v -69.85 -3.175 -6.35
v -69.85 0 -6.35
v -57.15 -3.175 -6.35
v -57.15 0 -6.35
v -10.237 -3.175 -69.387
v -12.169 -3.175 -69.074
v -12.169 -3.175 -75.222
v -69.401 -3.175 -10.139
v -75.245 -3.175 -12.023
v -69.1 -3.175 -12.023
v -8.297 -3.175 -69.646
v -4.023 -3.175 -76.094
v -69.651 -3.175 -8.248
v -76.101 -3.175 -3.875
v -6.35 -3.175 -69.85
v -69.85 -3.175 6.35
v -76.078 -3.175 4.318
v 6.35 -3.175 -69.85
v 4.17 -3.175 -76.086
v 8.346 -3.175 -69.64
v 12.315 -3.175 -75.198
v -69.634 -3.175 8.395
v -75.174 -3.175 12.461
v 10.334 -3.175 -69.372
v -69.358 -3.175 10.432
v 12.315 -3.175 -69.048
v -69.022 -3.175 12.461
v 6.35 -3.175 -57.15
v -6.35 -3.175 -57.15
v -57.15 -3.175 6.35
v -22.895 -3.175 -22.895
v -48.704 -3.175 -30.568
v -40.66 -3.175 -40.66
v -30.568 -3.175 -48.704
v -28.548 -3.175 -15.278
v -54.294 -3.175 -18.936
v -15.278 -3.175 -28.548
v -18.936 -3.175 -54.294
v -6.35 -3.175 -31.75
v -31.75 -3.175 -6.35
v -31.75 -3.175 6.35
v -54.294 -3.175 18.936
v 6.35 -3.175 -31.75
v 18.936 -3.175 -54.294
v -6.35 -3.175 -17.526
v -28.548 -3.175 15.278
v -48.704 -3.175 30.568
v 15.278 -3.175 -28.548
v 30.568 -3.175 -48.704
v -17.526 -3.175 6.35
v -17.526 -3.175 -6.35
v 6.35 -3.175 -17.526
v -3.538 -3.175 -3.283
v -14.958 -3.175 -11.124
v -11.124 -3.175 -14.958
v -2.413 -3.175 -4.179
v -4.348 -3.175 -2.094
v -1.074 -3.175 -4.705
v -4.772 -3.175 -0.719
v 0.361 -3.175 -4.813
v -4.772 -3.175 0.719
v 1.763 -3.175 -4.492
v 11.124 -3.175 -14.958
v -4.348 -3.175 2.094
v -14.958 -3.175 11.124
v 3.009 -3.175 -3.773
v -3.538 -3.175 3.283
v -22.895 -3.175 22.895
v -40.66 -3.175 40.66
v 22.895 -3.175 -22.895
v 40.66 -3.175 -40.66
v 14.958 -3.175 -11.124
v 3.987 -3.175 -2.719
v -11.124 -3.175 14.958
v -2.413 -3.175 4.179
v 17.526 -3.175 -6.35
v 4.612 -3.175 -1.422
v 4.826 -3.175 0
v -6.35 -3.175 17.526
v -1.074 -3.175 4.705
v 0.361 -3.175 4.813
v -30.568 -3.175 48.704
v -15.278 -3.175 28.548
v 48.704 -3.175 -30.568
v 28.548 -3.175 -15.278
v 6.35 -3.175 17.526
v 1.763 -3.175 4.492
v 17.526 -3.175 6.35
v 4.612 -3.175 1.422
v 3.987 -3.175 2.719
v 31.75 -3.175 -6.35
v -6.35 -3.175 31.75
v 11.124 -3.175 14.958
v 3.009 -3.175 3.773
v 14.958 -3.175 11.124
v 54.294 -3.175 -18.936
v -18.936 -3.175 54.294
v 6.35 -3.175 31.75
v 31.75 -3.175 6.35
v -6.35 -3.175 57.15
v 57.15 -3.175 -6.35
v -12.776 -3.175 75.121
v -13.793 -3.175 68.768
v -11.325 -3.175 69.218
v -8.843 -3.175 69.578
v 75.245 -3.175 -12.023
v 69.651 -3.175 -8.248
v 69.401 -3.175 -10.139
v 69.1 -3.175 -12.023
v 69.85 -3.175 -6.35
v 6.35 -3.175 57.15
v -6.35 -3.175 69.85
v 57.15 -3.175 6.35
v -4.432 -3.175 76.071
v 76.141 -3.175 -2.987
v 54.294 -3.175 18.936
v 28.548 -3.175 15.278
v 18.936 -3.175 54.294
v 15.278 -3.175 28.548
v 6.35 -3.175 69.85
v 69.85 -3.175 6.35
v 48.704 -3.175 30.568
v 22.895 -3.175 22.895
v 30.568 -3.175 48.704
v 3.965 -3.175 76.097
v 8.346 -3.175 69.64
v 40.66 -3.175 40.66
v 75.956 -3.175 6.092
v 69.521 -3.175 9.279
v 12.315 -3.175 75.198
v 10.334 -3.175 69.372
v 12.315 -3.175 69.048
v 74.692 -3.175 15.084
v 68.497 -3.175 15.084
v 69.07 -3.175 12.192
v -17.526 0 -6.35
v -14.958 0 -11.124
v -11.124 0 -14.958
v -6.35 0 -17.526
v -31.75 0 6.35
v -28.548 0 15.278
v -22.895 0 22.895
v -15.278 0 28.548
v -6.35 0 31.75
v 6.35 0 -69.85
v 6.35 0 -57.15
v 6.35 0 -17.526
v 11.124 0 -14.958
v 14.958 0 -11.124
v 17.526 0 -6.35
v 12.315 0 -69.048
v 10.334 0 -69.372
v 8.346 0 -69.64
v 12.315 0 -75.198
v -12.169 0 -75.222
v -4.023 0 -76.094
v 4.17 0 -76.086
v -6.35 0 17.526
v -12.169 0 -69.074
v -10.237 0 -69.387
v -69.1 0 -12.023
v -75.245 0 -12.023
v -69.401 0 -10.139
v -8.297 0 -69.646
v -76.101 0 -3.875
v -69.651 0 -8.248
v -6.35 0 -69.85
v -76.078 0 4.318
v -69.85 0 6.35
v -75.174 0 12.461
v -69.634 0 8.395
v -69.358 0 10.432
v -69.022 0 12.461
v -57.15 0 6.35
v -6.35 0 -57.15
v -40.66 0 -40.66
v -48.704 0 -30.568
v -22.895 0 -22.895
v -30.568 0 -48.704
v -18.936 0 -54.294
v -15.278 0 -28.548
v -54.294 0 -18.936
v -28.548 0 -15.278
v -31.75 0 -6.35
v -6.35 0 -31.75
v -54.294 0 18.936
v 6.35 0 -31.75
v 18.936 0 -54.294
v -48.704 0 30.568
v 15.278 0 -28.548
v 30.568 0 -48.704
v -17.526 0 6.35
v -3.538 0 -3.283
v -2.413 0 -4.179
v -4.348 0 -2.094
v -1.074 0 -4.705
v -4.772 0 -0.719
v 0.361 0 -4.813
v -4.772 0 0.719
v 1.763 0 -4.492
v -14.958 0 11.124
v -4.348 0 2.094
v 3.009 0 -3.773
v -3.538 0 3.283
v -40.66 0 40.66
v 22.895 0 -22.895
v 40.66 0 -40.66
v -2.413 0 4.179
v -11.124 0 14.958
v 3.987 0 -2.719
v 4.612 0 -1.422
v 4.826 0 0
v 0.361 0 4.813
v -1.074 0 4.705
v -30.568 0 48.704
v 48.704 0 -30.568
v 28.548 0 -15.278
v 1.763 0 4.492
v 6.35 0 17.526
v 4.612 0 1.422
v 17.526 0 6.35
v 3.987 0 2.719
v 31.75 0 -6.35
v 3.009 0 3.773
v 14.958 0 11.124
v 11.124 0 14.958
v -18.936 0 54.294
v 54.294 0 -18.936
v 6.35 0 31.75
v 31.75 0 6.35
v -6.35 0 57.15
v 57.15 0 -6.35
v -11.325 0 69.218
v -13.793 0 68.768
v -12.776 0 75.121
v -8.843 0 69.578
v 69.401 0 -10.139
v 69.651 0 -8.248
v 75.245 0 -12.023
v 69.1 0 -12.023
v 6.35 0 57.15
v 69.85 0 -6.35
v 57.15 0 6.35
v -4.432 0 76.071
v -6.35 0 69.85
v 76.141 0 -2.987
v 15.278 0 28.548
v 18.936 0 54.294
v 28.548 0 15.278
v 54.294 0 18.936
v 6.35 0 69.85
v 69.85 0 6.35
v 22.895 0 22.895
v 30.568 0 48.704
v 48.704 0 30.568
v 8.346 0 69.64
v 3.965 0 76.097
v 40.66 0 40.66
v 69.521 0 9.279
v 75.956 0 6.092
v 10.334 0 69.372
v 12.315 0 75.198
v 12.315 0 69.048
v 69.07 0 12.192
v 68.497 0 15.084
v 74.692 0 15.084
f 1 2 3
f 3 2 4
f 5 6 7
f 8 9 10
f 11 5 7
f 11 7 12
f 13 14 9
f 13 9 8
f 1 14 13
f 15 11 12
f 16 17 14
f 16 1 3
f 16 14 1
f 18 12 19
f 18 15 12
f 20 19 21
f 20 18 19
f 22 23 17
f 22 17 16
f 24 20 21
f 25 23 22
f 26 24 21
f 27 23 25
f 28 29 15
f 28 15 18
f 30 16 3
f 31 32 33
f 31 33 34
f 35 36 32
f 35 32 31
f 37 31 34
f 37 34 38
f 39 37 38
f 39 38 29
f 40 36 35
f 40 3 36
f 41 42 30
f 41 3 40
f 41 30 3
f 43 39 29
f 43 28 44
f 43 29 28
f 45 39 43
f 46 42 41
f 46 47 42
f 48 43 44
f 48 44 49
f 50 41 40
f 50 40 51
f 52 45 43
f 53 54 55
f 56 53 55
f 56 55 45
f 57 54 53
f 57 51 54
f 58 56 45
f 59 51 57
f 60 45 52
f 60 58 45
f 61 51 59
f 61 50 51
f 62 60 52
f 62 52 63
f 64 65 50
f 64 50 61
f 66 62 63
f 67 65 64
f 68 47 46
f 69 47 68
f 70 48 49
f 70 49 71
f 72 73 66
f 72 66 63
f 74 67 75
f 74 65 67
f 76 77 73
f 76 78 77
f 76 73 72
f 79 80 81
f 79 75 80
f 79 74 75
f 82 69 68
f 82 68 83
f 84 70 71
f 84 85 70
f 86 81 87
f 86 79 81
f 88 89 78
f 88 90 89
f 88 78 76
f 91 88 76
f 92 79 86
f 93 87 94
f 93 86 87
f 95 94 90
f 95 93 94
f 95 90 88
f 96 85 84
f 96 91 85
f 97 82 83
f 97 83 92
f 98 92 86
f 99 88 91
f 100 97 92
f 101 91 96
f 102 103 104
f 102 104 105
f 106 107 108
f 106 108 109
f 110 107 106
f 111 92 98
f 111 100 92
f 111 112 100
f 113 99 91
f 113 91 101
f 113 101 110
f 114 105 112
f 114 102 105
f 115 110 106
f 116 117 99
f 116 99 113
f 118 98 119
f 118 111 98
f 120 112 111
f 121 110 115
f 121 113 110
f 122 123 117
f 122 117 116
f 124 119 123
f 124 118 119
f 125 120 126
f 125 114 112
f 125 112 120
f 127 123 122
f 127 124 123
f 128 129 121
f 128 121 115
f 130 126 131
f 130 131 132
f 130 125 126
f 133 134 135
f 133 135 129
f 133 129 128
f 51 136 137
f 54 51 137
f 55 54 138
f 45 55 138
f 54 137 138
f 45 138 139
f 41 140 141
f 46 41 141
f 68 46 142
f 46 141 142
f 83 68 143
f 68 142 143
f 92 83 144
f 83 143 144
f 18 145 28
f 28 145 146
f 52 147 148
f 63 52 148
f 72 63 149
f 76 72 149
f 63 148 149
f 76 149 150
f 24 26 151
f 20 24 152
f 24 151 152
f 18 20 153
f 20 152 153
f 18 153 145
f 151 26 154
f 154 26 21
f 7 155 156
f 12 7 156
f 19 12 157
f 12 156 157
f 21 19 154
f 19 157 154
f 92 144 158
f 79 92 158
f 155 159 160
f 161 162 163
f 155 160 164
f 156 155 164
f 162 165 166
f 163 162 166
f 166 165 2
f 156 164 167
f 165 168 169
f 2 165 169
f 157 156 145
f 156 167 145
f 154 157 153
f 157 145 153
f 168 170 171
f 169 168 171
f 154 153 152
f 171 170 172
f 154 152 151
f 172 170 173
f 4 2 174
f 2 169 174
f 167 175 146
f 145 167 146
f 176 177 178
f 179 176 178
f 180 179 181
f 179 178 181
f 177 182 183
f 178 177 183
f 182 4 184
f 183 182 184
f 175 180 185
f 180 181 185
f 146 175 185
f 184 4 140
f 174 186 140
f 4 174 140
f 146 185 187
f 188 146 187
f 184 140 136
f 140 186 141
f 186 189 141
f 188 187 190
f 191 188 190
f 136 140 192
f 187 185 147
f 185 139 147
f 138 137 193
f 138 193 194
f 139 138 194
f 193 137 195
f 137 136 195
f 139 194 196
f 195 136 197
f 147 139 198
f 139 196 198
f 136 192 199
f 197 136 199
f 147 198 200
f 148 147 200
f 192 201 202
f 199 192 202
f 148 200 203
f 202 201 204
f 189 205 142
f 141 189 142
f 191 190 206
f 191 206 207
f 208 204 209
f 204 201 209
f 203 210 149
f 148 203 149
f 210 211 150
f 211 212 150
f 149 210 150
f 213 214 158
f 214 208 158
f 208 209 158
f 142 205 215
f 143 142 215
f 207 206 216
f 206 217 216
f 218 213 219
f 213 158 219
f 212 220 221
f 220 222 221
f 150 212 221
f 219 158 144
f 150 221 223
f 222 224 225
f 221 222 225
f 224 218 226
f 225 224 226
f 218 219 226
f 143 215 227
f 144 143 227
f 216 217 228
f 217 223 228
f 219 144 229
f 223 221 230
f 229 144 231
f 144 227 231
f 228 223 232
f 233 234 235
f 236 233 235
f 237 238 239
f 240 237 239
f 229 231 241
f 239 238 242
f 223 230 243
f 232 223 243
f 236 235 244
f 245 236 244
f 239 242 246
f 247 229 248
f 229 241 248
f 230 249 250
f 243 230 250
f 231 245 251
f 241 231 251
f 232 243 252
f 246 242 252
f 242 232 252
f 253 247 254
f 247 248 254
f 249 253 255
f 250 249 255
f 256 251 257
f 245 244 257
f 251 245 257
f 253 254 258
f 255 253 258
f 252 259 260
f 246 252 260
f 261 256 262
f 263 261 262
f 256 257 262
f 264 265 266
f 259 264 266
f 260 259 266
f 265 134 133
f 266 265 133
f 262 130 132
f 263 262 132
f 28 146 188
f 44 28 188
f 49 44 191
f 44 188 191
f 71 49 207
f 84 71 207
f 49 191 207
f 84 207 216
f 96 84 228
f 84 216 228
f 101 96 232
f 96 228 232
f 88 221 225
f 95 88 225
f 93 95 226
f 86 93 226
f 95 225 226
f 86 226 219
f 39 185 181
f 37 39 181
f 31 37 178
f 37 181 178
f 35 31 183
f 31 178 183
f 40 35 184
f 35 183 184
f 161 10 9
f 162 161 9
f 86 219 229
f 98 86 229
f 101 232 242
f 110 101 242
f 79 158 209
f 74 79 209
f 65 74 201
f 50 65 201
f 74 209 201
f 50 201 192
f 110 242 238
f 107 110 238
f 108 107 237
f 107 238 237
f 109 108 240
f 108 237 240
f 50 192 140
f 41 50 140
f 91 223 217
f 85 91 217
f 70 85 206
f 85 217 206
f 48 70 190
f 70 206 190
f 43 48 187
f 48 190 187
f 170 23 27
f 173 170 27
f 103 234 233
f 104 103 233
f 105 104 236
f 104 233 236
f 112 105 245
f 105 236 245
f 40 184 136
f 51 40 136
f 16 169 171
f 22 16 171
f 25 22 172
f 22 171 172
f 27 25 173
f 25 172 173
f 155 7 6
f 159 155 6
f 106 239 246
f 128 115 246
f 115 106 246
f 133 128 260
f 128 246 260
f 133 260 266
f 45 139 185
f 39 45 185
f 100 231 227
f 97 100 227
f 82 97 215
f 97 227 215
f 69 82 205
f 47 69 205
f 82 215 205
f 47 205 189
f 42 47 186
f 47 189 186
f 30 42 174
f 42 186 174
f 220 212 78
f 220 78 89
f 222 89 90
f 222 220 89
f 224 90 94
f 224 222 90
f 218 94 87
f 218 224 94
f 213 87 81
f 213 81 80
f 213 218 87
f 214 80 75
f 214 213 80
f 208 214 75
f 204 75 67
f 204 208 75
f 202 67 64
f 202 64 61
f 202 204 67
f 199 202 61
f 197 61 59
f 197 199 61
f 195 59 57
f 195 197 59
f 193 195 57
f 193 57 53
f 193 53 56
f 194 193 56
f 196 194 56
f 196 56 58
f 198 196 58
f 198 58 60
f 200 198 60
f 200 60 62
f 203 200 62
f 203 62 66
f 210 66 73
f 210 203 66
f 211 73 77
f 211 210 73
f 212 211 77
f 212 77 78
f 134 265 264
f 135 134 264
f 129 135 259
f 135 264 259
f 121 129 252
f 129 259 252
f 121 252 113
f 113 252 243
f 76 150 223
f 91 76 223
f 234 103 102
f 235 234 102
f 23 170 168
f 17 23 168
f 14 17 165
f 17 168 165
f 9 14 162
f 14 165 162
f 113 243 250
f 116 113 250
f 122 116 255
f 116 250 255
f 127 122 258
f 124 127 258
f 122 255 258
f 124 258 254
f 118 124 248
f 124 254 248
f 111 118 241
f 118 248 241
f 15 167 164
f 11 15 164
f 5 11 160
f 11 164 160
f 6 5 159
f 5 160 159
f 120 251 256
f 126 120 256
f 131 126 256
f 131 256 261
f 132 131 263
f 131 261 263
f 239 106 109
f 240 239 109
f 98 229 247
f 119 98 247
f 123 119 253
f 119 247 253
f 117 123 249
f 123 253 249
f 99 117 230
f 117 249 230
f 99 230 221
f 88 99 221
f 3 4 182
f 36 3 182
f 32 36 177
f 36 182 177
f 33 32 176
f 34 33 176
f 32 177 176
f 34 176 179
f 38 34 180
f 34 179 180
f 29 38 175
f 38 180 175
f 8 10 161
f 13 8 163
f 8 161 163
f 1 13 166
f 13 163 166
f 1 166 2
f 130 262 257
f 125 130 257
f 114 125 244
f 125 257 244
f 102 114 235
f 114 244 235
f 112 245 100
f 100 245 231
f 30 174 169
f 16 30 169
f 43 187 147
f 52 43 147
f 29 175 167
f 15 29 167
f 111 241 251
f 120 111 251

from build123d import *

# Parameters (mm, degrees)
F0_R     = 76.2
F0_R_2   = 4.826
F1_DEPTH = 3.175
F3_DEPTH = 25.4


with BuildPart() as f1:
    # F0 (on Front) → F1 (new body)
    with BuildSketch(Plane.XZ):
        Circle(F0_R)
        with BuildLine():
            ThreePointArc((-57.15, -6.35), (-40.659839, -40.659839), (-6.35, -57.15))
            Line((-6.35, -57.15), (-6.35, -69.85))
            ThreePointArc((-6.35, -69.85), (-49.595085, -49.595085), (-69.85, -6.35))
            Line((-69.85, -6.35), (-57.15, -6.35))
        make_face(mode=Mode.SUBTRACT)
        with BuildLine():
            Line((-31.75, -6.35), (-17.526, -6.35))
            ThreePointArc((-17.526, -6.35), (-13.181107, -13.181107), (-6.35, -17.526))
            Line((-6.35, -17.526), (-6.35, -31.75))
            ThreePointArc((-6.35, -31.75), (-22.895251, -22.895251), (-31.75, -6.35))
        make_face(mode=Mode.SUBTRACT)
        with BuildLine():
            Line((6.35, -31.75), (6.35, -17.526))
            ThreePointArc((6.35, -17.526), (13.181107, -13.181107), (17.526, -6.35))
            Line((17.526, -6.35), (31.75, -6.35))
            ThreePointArc((31.75, -6.35), (22.895251, -22.895251), (6.35, -31.75))
        make_face(mode=Mode.SUBTRACT)
        with BuildLine():
            ThreePointArc((6.35, -57.15), (40.659839, -40.659839), (57.15, -6.35))
            Line((57.15, -6.35), (69.85, -6.35))
            ThreePointArc((69.85, -6.35), (49.595085, -49.595085), (6.35, -69.85))
            Line((6.35, -69.85), (6.35, -57.15))
        make_face(mode=Mode.SUBTRACT)
        with BuildLine():
            Line((-6.35, 31.75), (-6.35, 17.526))
            ThreePointArc((-6.35, 17.526), (-13.181107, 13.181107), (-17.526, 6.35))
            Line((-17.526, 6.35), (-31.75, 6.35))
            ThreePointArc((-31.75, 6.35), (-22.895251, 22.895251), (-6.35, 31.75))
        make_face(mode=Mode.SUBTRACT)
        with BuildLine():
            ThreePointArc((-6.35, 57.15), (-40.659839, 40.659839), (-57.15, 6.35))
            Line((-57.15, 6.35), (-69.85, 6.35))
            ThreePointArc((-69.85, 6.35), (-49.595085, 49.595085), (-6.35, 69.85))
            Line((-6.35, 69.85), (-6.35, 57.15))
        make_face(mode=Mode.SUBTRACT)
        Circle(F0_R_2, mode=Mode.SUBTRACT)
        with BuildLine():
            Line((31.75, 6.35), (17.526, 6.35))
            ThreePointArc((17.526, 6.35), (13.181107, 13.181107), (6.35, 17.526))
            Line((6.35, 17.526), (6.35, 31.75))
            ThreePointArc((6.35, 31.75), (22.895251, 22.895251), (31.75, 6.35))
        make_face(mode=Mode.SUBTRACT)
        with BuildLine():
            ThreePointArc((57.15, 6.35), (40.659839, 40.659839), (6.35, 57.15))
            Line((6.35, 57.15), (6.35, 69.85))
            ThreePointArc((6.35, 69.85), (49.595085, 49.595085), (69.85, 6.35))
            Line((69.85, 6.35), (57.15, 6.35))
        make_face(mode=Mode.SUBTRACT)
    extrude(amount=F1_DEPTH)

    # F2 (on face) → F3 (cut)
    with BuildSketch(Plane.XZ.offset(3.175)):
        Polygon((-81.831723, 12.460574), (-65.217622, 12.460574), (-44.52287, 45.105822), (-14.500901, 64.343199), (-12.169099, 78.916967), (-54.433033, 65.509103), align=None)
        Polygon((12.314837, 79.499915), (12.314837, 63.468769), (44.668611, 47.146149), (63.323036, 15.083852), (85.183688, 15.083852), (62.157135, 64.634673), align=None)
        Polygon((91.596149, -12.02336), (63.61451, -12.02336), (48.457786, -43.794177), (12.314837, -60.991228), (12.314837, -79.354182), (57.15, -66.820741), align=None)
        Polygon((-12.169099, -78.771226), (-12.169099, -63.5), (-48.312049, -43.794177), (-63.177295, -12.02336), (-81.248775, -12.02336), (-76.87664, -30.969264), (-63.177295, -60.991228), align=None)
    extrude(amount=-F3_DEPTH, mode=Mode.SUBTRACT)


solid = f1.part
